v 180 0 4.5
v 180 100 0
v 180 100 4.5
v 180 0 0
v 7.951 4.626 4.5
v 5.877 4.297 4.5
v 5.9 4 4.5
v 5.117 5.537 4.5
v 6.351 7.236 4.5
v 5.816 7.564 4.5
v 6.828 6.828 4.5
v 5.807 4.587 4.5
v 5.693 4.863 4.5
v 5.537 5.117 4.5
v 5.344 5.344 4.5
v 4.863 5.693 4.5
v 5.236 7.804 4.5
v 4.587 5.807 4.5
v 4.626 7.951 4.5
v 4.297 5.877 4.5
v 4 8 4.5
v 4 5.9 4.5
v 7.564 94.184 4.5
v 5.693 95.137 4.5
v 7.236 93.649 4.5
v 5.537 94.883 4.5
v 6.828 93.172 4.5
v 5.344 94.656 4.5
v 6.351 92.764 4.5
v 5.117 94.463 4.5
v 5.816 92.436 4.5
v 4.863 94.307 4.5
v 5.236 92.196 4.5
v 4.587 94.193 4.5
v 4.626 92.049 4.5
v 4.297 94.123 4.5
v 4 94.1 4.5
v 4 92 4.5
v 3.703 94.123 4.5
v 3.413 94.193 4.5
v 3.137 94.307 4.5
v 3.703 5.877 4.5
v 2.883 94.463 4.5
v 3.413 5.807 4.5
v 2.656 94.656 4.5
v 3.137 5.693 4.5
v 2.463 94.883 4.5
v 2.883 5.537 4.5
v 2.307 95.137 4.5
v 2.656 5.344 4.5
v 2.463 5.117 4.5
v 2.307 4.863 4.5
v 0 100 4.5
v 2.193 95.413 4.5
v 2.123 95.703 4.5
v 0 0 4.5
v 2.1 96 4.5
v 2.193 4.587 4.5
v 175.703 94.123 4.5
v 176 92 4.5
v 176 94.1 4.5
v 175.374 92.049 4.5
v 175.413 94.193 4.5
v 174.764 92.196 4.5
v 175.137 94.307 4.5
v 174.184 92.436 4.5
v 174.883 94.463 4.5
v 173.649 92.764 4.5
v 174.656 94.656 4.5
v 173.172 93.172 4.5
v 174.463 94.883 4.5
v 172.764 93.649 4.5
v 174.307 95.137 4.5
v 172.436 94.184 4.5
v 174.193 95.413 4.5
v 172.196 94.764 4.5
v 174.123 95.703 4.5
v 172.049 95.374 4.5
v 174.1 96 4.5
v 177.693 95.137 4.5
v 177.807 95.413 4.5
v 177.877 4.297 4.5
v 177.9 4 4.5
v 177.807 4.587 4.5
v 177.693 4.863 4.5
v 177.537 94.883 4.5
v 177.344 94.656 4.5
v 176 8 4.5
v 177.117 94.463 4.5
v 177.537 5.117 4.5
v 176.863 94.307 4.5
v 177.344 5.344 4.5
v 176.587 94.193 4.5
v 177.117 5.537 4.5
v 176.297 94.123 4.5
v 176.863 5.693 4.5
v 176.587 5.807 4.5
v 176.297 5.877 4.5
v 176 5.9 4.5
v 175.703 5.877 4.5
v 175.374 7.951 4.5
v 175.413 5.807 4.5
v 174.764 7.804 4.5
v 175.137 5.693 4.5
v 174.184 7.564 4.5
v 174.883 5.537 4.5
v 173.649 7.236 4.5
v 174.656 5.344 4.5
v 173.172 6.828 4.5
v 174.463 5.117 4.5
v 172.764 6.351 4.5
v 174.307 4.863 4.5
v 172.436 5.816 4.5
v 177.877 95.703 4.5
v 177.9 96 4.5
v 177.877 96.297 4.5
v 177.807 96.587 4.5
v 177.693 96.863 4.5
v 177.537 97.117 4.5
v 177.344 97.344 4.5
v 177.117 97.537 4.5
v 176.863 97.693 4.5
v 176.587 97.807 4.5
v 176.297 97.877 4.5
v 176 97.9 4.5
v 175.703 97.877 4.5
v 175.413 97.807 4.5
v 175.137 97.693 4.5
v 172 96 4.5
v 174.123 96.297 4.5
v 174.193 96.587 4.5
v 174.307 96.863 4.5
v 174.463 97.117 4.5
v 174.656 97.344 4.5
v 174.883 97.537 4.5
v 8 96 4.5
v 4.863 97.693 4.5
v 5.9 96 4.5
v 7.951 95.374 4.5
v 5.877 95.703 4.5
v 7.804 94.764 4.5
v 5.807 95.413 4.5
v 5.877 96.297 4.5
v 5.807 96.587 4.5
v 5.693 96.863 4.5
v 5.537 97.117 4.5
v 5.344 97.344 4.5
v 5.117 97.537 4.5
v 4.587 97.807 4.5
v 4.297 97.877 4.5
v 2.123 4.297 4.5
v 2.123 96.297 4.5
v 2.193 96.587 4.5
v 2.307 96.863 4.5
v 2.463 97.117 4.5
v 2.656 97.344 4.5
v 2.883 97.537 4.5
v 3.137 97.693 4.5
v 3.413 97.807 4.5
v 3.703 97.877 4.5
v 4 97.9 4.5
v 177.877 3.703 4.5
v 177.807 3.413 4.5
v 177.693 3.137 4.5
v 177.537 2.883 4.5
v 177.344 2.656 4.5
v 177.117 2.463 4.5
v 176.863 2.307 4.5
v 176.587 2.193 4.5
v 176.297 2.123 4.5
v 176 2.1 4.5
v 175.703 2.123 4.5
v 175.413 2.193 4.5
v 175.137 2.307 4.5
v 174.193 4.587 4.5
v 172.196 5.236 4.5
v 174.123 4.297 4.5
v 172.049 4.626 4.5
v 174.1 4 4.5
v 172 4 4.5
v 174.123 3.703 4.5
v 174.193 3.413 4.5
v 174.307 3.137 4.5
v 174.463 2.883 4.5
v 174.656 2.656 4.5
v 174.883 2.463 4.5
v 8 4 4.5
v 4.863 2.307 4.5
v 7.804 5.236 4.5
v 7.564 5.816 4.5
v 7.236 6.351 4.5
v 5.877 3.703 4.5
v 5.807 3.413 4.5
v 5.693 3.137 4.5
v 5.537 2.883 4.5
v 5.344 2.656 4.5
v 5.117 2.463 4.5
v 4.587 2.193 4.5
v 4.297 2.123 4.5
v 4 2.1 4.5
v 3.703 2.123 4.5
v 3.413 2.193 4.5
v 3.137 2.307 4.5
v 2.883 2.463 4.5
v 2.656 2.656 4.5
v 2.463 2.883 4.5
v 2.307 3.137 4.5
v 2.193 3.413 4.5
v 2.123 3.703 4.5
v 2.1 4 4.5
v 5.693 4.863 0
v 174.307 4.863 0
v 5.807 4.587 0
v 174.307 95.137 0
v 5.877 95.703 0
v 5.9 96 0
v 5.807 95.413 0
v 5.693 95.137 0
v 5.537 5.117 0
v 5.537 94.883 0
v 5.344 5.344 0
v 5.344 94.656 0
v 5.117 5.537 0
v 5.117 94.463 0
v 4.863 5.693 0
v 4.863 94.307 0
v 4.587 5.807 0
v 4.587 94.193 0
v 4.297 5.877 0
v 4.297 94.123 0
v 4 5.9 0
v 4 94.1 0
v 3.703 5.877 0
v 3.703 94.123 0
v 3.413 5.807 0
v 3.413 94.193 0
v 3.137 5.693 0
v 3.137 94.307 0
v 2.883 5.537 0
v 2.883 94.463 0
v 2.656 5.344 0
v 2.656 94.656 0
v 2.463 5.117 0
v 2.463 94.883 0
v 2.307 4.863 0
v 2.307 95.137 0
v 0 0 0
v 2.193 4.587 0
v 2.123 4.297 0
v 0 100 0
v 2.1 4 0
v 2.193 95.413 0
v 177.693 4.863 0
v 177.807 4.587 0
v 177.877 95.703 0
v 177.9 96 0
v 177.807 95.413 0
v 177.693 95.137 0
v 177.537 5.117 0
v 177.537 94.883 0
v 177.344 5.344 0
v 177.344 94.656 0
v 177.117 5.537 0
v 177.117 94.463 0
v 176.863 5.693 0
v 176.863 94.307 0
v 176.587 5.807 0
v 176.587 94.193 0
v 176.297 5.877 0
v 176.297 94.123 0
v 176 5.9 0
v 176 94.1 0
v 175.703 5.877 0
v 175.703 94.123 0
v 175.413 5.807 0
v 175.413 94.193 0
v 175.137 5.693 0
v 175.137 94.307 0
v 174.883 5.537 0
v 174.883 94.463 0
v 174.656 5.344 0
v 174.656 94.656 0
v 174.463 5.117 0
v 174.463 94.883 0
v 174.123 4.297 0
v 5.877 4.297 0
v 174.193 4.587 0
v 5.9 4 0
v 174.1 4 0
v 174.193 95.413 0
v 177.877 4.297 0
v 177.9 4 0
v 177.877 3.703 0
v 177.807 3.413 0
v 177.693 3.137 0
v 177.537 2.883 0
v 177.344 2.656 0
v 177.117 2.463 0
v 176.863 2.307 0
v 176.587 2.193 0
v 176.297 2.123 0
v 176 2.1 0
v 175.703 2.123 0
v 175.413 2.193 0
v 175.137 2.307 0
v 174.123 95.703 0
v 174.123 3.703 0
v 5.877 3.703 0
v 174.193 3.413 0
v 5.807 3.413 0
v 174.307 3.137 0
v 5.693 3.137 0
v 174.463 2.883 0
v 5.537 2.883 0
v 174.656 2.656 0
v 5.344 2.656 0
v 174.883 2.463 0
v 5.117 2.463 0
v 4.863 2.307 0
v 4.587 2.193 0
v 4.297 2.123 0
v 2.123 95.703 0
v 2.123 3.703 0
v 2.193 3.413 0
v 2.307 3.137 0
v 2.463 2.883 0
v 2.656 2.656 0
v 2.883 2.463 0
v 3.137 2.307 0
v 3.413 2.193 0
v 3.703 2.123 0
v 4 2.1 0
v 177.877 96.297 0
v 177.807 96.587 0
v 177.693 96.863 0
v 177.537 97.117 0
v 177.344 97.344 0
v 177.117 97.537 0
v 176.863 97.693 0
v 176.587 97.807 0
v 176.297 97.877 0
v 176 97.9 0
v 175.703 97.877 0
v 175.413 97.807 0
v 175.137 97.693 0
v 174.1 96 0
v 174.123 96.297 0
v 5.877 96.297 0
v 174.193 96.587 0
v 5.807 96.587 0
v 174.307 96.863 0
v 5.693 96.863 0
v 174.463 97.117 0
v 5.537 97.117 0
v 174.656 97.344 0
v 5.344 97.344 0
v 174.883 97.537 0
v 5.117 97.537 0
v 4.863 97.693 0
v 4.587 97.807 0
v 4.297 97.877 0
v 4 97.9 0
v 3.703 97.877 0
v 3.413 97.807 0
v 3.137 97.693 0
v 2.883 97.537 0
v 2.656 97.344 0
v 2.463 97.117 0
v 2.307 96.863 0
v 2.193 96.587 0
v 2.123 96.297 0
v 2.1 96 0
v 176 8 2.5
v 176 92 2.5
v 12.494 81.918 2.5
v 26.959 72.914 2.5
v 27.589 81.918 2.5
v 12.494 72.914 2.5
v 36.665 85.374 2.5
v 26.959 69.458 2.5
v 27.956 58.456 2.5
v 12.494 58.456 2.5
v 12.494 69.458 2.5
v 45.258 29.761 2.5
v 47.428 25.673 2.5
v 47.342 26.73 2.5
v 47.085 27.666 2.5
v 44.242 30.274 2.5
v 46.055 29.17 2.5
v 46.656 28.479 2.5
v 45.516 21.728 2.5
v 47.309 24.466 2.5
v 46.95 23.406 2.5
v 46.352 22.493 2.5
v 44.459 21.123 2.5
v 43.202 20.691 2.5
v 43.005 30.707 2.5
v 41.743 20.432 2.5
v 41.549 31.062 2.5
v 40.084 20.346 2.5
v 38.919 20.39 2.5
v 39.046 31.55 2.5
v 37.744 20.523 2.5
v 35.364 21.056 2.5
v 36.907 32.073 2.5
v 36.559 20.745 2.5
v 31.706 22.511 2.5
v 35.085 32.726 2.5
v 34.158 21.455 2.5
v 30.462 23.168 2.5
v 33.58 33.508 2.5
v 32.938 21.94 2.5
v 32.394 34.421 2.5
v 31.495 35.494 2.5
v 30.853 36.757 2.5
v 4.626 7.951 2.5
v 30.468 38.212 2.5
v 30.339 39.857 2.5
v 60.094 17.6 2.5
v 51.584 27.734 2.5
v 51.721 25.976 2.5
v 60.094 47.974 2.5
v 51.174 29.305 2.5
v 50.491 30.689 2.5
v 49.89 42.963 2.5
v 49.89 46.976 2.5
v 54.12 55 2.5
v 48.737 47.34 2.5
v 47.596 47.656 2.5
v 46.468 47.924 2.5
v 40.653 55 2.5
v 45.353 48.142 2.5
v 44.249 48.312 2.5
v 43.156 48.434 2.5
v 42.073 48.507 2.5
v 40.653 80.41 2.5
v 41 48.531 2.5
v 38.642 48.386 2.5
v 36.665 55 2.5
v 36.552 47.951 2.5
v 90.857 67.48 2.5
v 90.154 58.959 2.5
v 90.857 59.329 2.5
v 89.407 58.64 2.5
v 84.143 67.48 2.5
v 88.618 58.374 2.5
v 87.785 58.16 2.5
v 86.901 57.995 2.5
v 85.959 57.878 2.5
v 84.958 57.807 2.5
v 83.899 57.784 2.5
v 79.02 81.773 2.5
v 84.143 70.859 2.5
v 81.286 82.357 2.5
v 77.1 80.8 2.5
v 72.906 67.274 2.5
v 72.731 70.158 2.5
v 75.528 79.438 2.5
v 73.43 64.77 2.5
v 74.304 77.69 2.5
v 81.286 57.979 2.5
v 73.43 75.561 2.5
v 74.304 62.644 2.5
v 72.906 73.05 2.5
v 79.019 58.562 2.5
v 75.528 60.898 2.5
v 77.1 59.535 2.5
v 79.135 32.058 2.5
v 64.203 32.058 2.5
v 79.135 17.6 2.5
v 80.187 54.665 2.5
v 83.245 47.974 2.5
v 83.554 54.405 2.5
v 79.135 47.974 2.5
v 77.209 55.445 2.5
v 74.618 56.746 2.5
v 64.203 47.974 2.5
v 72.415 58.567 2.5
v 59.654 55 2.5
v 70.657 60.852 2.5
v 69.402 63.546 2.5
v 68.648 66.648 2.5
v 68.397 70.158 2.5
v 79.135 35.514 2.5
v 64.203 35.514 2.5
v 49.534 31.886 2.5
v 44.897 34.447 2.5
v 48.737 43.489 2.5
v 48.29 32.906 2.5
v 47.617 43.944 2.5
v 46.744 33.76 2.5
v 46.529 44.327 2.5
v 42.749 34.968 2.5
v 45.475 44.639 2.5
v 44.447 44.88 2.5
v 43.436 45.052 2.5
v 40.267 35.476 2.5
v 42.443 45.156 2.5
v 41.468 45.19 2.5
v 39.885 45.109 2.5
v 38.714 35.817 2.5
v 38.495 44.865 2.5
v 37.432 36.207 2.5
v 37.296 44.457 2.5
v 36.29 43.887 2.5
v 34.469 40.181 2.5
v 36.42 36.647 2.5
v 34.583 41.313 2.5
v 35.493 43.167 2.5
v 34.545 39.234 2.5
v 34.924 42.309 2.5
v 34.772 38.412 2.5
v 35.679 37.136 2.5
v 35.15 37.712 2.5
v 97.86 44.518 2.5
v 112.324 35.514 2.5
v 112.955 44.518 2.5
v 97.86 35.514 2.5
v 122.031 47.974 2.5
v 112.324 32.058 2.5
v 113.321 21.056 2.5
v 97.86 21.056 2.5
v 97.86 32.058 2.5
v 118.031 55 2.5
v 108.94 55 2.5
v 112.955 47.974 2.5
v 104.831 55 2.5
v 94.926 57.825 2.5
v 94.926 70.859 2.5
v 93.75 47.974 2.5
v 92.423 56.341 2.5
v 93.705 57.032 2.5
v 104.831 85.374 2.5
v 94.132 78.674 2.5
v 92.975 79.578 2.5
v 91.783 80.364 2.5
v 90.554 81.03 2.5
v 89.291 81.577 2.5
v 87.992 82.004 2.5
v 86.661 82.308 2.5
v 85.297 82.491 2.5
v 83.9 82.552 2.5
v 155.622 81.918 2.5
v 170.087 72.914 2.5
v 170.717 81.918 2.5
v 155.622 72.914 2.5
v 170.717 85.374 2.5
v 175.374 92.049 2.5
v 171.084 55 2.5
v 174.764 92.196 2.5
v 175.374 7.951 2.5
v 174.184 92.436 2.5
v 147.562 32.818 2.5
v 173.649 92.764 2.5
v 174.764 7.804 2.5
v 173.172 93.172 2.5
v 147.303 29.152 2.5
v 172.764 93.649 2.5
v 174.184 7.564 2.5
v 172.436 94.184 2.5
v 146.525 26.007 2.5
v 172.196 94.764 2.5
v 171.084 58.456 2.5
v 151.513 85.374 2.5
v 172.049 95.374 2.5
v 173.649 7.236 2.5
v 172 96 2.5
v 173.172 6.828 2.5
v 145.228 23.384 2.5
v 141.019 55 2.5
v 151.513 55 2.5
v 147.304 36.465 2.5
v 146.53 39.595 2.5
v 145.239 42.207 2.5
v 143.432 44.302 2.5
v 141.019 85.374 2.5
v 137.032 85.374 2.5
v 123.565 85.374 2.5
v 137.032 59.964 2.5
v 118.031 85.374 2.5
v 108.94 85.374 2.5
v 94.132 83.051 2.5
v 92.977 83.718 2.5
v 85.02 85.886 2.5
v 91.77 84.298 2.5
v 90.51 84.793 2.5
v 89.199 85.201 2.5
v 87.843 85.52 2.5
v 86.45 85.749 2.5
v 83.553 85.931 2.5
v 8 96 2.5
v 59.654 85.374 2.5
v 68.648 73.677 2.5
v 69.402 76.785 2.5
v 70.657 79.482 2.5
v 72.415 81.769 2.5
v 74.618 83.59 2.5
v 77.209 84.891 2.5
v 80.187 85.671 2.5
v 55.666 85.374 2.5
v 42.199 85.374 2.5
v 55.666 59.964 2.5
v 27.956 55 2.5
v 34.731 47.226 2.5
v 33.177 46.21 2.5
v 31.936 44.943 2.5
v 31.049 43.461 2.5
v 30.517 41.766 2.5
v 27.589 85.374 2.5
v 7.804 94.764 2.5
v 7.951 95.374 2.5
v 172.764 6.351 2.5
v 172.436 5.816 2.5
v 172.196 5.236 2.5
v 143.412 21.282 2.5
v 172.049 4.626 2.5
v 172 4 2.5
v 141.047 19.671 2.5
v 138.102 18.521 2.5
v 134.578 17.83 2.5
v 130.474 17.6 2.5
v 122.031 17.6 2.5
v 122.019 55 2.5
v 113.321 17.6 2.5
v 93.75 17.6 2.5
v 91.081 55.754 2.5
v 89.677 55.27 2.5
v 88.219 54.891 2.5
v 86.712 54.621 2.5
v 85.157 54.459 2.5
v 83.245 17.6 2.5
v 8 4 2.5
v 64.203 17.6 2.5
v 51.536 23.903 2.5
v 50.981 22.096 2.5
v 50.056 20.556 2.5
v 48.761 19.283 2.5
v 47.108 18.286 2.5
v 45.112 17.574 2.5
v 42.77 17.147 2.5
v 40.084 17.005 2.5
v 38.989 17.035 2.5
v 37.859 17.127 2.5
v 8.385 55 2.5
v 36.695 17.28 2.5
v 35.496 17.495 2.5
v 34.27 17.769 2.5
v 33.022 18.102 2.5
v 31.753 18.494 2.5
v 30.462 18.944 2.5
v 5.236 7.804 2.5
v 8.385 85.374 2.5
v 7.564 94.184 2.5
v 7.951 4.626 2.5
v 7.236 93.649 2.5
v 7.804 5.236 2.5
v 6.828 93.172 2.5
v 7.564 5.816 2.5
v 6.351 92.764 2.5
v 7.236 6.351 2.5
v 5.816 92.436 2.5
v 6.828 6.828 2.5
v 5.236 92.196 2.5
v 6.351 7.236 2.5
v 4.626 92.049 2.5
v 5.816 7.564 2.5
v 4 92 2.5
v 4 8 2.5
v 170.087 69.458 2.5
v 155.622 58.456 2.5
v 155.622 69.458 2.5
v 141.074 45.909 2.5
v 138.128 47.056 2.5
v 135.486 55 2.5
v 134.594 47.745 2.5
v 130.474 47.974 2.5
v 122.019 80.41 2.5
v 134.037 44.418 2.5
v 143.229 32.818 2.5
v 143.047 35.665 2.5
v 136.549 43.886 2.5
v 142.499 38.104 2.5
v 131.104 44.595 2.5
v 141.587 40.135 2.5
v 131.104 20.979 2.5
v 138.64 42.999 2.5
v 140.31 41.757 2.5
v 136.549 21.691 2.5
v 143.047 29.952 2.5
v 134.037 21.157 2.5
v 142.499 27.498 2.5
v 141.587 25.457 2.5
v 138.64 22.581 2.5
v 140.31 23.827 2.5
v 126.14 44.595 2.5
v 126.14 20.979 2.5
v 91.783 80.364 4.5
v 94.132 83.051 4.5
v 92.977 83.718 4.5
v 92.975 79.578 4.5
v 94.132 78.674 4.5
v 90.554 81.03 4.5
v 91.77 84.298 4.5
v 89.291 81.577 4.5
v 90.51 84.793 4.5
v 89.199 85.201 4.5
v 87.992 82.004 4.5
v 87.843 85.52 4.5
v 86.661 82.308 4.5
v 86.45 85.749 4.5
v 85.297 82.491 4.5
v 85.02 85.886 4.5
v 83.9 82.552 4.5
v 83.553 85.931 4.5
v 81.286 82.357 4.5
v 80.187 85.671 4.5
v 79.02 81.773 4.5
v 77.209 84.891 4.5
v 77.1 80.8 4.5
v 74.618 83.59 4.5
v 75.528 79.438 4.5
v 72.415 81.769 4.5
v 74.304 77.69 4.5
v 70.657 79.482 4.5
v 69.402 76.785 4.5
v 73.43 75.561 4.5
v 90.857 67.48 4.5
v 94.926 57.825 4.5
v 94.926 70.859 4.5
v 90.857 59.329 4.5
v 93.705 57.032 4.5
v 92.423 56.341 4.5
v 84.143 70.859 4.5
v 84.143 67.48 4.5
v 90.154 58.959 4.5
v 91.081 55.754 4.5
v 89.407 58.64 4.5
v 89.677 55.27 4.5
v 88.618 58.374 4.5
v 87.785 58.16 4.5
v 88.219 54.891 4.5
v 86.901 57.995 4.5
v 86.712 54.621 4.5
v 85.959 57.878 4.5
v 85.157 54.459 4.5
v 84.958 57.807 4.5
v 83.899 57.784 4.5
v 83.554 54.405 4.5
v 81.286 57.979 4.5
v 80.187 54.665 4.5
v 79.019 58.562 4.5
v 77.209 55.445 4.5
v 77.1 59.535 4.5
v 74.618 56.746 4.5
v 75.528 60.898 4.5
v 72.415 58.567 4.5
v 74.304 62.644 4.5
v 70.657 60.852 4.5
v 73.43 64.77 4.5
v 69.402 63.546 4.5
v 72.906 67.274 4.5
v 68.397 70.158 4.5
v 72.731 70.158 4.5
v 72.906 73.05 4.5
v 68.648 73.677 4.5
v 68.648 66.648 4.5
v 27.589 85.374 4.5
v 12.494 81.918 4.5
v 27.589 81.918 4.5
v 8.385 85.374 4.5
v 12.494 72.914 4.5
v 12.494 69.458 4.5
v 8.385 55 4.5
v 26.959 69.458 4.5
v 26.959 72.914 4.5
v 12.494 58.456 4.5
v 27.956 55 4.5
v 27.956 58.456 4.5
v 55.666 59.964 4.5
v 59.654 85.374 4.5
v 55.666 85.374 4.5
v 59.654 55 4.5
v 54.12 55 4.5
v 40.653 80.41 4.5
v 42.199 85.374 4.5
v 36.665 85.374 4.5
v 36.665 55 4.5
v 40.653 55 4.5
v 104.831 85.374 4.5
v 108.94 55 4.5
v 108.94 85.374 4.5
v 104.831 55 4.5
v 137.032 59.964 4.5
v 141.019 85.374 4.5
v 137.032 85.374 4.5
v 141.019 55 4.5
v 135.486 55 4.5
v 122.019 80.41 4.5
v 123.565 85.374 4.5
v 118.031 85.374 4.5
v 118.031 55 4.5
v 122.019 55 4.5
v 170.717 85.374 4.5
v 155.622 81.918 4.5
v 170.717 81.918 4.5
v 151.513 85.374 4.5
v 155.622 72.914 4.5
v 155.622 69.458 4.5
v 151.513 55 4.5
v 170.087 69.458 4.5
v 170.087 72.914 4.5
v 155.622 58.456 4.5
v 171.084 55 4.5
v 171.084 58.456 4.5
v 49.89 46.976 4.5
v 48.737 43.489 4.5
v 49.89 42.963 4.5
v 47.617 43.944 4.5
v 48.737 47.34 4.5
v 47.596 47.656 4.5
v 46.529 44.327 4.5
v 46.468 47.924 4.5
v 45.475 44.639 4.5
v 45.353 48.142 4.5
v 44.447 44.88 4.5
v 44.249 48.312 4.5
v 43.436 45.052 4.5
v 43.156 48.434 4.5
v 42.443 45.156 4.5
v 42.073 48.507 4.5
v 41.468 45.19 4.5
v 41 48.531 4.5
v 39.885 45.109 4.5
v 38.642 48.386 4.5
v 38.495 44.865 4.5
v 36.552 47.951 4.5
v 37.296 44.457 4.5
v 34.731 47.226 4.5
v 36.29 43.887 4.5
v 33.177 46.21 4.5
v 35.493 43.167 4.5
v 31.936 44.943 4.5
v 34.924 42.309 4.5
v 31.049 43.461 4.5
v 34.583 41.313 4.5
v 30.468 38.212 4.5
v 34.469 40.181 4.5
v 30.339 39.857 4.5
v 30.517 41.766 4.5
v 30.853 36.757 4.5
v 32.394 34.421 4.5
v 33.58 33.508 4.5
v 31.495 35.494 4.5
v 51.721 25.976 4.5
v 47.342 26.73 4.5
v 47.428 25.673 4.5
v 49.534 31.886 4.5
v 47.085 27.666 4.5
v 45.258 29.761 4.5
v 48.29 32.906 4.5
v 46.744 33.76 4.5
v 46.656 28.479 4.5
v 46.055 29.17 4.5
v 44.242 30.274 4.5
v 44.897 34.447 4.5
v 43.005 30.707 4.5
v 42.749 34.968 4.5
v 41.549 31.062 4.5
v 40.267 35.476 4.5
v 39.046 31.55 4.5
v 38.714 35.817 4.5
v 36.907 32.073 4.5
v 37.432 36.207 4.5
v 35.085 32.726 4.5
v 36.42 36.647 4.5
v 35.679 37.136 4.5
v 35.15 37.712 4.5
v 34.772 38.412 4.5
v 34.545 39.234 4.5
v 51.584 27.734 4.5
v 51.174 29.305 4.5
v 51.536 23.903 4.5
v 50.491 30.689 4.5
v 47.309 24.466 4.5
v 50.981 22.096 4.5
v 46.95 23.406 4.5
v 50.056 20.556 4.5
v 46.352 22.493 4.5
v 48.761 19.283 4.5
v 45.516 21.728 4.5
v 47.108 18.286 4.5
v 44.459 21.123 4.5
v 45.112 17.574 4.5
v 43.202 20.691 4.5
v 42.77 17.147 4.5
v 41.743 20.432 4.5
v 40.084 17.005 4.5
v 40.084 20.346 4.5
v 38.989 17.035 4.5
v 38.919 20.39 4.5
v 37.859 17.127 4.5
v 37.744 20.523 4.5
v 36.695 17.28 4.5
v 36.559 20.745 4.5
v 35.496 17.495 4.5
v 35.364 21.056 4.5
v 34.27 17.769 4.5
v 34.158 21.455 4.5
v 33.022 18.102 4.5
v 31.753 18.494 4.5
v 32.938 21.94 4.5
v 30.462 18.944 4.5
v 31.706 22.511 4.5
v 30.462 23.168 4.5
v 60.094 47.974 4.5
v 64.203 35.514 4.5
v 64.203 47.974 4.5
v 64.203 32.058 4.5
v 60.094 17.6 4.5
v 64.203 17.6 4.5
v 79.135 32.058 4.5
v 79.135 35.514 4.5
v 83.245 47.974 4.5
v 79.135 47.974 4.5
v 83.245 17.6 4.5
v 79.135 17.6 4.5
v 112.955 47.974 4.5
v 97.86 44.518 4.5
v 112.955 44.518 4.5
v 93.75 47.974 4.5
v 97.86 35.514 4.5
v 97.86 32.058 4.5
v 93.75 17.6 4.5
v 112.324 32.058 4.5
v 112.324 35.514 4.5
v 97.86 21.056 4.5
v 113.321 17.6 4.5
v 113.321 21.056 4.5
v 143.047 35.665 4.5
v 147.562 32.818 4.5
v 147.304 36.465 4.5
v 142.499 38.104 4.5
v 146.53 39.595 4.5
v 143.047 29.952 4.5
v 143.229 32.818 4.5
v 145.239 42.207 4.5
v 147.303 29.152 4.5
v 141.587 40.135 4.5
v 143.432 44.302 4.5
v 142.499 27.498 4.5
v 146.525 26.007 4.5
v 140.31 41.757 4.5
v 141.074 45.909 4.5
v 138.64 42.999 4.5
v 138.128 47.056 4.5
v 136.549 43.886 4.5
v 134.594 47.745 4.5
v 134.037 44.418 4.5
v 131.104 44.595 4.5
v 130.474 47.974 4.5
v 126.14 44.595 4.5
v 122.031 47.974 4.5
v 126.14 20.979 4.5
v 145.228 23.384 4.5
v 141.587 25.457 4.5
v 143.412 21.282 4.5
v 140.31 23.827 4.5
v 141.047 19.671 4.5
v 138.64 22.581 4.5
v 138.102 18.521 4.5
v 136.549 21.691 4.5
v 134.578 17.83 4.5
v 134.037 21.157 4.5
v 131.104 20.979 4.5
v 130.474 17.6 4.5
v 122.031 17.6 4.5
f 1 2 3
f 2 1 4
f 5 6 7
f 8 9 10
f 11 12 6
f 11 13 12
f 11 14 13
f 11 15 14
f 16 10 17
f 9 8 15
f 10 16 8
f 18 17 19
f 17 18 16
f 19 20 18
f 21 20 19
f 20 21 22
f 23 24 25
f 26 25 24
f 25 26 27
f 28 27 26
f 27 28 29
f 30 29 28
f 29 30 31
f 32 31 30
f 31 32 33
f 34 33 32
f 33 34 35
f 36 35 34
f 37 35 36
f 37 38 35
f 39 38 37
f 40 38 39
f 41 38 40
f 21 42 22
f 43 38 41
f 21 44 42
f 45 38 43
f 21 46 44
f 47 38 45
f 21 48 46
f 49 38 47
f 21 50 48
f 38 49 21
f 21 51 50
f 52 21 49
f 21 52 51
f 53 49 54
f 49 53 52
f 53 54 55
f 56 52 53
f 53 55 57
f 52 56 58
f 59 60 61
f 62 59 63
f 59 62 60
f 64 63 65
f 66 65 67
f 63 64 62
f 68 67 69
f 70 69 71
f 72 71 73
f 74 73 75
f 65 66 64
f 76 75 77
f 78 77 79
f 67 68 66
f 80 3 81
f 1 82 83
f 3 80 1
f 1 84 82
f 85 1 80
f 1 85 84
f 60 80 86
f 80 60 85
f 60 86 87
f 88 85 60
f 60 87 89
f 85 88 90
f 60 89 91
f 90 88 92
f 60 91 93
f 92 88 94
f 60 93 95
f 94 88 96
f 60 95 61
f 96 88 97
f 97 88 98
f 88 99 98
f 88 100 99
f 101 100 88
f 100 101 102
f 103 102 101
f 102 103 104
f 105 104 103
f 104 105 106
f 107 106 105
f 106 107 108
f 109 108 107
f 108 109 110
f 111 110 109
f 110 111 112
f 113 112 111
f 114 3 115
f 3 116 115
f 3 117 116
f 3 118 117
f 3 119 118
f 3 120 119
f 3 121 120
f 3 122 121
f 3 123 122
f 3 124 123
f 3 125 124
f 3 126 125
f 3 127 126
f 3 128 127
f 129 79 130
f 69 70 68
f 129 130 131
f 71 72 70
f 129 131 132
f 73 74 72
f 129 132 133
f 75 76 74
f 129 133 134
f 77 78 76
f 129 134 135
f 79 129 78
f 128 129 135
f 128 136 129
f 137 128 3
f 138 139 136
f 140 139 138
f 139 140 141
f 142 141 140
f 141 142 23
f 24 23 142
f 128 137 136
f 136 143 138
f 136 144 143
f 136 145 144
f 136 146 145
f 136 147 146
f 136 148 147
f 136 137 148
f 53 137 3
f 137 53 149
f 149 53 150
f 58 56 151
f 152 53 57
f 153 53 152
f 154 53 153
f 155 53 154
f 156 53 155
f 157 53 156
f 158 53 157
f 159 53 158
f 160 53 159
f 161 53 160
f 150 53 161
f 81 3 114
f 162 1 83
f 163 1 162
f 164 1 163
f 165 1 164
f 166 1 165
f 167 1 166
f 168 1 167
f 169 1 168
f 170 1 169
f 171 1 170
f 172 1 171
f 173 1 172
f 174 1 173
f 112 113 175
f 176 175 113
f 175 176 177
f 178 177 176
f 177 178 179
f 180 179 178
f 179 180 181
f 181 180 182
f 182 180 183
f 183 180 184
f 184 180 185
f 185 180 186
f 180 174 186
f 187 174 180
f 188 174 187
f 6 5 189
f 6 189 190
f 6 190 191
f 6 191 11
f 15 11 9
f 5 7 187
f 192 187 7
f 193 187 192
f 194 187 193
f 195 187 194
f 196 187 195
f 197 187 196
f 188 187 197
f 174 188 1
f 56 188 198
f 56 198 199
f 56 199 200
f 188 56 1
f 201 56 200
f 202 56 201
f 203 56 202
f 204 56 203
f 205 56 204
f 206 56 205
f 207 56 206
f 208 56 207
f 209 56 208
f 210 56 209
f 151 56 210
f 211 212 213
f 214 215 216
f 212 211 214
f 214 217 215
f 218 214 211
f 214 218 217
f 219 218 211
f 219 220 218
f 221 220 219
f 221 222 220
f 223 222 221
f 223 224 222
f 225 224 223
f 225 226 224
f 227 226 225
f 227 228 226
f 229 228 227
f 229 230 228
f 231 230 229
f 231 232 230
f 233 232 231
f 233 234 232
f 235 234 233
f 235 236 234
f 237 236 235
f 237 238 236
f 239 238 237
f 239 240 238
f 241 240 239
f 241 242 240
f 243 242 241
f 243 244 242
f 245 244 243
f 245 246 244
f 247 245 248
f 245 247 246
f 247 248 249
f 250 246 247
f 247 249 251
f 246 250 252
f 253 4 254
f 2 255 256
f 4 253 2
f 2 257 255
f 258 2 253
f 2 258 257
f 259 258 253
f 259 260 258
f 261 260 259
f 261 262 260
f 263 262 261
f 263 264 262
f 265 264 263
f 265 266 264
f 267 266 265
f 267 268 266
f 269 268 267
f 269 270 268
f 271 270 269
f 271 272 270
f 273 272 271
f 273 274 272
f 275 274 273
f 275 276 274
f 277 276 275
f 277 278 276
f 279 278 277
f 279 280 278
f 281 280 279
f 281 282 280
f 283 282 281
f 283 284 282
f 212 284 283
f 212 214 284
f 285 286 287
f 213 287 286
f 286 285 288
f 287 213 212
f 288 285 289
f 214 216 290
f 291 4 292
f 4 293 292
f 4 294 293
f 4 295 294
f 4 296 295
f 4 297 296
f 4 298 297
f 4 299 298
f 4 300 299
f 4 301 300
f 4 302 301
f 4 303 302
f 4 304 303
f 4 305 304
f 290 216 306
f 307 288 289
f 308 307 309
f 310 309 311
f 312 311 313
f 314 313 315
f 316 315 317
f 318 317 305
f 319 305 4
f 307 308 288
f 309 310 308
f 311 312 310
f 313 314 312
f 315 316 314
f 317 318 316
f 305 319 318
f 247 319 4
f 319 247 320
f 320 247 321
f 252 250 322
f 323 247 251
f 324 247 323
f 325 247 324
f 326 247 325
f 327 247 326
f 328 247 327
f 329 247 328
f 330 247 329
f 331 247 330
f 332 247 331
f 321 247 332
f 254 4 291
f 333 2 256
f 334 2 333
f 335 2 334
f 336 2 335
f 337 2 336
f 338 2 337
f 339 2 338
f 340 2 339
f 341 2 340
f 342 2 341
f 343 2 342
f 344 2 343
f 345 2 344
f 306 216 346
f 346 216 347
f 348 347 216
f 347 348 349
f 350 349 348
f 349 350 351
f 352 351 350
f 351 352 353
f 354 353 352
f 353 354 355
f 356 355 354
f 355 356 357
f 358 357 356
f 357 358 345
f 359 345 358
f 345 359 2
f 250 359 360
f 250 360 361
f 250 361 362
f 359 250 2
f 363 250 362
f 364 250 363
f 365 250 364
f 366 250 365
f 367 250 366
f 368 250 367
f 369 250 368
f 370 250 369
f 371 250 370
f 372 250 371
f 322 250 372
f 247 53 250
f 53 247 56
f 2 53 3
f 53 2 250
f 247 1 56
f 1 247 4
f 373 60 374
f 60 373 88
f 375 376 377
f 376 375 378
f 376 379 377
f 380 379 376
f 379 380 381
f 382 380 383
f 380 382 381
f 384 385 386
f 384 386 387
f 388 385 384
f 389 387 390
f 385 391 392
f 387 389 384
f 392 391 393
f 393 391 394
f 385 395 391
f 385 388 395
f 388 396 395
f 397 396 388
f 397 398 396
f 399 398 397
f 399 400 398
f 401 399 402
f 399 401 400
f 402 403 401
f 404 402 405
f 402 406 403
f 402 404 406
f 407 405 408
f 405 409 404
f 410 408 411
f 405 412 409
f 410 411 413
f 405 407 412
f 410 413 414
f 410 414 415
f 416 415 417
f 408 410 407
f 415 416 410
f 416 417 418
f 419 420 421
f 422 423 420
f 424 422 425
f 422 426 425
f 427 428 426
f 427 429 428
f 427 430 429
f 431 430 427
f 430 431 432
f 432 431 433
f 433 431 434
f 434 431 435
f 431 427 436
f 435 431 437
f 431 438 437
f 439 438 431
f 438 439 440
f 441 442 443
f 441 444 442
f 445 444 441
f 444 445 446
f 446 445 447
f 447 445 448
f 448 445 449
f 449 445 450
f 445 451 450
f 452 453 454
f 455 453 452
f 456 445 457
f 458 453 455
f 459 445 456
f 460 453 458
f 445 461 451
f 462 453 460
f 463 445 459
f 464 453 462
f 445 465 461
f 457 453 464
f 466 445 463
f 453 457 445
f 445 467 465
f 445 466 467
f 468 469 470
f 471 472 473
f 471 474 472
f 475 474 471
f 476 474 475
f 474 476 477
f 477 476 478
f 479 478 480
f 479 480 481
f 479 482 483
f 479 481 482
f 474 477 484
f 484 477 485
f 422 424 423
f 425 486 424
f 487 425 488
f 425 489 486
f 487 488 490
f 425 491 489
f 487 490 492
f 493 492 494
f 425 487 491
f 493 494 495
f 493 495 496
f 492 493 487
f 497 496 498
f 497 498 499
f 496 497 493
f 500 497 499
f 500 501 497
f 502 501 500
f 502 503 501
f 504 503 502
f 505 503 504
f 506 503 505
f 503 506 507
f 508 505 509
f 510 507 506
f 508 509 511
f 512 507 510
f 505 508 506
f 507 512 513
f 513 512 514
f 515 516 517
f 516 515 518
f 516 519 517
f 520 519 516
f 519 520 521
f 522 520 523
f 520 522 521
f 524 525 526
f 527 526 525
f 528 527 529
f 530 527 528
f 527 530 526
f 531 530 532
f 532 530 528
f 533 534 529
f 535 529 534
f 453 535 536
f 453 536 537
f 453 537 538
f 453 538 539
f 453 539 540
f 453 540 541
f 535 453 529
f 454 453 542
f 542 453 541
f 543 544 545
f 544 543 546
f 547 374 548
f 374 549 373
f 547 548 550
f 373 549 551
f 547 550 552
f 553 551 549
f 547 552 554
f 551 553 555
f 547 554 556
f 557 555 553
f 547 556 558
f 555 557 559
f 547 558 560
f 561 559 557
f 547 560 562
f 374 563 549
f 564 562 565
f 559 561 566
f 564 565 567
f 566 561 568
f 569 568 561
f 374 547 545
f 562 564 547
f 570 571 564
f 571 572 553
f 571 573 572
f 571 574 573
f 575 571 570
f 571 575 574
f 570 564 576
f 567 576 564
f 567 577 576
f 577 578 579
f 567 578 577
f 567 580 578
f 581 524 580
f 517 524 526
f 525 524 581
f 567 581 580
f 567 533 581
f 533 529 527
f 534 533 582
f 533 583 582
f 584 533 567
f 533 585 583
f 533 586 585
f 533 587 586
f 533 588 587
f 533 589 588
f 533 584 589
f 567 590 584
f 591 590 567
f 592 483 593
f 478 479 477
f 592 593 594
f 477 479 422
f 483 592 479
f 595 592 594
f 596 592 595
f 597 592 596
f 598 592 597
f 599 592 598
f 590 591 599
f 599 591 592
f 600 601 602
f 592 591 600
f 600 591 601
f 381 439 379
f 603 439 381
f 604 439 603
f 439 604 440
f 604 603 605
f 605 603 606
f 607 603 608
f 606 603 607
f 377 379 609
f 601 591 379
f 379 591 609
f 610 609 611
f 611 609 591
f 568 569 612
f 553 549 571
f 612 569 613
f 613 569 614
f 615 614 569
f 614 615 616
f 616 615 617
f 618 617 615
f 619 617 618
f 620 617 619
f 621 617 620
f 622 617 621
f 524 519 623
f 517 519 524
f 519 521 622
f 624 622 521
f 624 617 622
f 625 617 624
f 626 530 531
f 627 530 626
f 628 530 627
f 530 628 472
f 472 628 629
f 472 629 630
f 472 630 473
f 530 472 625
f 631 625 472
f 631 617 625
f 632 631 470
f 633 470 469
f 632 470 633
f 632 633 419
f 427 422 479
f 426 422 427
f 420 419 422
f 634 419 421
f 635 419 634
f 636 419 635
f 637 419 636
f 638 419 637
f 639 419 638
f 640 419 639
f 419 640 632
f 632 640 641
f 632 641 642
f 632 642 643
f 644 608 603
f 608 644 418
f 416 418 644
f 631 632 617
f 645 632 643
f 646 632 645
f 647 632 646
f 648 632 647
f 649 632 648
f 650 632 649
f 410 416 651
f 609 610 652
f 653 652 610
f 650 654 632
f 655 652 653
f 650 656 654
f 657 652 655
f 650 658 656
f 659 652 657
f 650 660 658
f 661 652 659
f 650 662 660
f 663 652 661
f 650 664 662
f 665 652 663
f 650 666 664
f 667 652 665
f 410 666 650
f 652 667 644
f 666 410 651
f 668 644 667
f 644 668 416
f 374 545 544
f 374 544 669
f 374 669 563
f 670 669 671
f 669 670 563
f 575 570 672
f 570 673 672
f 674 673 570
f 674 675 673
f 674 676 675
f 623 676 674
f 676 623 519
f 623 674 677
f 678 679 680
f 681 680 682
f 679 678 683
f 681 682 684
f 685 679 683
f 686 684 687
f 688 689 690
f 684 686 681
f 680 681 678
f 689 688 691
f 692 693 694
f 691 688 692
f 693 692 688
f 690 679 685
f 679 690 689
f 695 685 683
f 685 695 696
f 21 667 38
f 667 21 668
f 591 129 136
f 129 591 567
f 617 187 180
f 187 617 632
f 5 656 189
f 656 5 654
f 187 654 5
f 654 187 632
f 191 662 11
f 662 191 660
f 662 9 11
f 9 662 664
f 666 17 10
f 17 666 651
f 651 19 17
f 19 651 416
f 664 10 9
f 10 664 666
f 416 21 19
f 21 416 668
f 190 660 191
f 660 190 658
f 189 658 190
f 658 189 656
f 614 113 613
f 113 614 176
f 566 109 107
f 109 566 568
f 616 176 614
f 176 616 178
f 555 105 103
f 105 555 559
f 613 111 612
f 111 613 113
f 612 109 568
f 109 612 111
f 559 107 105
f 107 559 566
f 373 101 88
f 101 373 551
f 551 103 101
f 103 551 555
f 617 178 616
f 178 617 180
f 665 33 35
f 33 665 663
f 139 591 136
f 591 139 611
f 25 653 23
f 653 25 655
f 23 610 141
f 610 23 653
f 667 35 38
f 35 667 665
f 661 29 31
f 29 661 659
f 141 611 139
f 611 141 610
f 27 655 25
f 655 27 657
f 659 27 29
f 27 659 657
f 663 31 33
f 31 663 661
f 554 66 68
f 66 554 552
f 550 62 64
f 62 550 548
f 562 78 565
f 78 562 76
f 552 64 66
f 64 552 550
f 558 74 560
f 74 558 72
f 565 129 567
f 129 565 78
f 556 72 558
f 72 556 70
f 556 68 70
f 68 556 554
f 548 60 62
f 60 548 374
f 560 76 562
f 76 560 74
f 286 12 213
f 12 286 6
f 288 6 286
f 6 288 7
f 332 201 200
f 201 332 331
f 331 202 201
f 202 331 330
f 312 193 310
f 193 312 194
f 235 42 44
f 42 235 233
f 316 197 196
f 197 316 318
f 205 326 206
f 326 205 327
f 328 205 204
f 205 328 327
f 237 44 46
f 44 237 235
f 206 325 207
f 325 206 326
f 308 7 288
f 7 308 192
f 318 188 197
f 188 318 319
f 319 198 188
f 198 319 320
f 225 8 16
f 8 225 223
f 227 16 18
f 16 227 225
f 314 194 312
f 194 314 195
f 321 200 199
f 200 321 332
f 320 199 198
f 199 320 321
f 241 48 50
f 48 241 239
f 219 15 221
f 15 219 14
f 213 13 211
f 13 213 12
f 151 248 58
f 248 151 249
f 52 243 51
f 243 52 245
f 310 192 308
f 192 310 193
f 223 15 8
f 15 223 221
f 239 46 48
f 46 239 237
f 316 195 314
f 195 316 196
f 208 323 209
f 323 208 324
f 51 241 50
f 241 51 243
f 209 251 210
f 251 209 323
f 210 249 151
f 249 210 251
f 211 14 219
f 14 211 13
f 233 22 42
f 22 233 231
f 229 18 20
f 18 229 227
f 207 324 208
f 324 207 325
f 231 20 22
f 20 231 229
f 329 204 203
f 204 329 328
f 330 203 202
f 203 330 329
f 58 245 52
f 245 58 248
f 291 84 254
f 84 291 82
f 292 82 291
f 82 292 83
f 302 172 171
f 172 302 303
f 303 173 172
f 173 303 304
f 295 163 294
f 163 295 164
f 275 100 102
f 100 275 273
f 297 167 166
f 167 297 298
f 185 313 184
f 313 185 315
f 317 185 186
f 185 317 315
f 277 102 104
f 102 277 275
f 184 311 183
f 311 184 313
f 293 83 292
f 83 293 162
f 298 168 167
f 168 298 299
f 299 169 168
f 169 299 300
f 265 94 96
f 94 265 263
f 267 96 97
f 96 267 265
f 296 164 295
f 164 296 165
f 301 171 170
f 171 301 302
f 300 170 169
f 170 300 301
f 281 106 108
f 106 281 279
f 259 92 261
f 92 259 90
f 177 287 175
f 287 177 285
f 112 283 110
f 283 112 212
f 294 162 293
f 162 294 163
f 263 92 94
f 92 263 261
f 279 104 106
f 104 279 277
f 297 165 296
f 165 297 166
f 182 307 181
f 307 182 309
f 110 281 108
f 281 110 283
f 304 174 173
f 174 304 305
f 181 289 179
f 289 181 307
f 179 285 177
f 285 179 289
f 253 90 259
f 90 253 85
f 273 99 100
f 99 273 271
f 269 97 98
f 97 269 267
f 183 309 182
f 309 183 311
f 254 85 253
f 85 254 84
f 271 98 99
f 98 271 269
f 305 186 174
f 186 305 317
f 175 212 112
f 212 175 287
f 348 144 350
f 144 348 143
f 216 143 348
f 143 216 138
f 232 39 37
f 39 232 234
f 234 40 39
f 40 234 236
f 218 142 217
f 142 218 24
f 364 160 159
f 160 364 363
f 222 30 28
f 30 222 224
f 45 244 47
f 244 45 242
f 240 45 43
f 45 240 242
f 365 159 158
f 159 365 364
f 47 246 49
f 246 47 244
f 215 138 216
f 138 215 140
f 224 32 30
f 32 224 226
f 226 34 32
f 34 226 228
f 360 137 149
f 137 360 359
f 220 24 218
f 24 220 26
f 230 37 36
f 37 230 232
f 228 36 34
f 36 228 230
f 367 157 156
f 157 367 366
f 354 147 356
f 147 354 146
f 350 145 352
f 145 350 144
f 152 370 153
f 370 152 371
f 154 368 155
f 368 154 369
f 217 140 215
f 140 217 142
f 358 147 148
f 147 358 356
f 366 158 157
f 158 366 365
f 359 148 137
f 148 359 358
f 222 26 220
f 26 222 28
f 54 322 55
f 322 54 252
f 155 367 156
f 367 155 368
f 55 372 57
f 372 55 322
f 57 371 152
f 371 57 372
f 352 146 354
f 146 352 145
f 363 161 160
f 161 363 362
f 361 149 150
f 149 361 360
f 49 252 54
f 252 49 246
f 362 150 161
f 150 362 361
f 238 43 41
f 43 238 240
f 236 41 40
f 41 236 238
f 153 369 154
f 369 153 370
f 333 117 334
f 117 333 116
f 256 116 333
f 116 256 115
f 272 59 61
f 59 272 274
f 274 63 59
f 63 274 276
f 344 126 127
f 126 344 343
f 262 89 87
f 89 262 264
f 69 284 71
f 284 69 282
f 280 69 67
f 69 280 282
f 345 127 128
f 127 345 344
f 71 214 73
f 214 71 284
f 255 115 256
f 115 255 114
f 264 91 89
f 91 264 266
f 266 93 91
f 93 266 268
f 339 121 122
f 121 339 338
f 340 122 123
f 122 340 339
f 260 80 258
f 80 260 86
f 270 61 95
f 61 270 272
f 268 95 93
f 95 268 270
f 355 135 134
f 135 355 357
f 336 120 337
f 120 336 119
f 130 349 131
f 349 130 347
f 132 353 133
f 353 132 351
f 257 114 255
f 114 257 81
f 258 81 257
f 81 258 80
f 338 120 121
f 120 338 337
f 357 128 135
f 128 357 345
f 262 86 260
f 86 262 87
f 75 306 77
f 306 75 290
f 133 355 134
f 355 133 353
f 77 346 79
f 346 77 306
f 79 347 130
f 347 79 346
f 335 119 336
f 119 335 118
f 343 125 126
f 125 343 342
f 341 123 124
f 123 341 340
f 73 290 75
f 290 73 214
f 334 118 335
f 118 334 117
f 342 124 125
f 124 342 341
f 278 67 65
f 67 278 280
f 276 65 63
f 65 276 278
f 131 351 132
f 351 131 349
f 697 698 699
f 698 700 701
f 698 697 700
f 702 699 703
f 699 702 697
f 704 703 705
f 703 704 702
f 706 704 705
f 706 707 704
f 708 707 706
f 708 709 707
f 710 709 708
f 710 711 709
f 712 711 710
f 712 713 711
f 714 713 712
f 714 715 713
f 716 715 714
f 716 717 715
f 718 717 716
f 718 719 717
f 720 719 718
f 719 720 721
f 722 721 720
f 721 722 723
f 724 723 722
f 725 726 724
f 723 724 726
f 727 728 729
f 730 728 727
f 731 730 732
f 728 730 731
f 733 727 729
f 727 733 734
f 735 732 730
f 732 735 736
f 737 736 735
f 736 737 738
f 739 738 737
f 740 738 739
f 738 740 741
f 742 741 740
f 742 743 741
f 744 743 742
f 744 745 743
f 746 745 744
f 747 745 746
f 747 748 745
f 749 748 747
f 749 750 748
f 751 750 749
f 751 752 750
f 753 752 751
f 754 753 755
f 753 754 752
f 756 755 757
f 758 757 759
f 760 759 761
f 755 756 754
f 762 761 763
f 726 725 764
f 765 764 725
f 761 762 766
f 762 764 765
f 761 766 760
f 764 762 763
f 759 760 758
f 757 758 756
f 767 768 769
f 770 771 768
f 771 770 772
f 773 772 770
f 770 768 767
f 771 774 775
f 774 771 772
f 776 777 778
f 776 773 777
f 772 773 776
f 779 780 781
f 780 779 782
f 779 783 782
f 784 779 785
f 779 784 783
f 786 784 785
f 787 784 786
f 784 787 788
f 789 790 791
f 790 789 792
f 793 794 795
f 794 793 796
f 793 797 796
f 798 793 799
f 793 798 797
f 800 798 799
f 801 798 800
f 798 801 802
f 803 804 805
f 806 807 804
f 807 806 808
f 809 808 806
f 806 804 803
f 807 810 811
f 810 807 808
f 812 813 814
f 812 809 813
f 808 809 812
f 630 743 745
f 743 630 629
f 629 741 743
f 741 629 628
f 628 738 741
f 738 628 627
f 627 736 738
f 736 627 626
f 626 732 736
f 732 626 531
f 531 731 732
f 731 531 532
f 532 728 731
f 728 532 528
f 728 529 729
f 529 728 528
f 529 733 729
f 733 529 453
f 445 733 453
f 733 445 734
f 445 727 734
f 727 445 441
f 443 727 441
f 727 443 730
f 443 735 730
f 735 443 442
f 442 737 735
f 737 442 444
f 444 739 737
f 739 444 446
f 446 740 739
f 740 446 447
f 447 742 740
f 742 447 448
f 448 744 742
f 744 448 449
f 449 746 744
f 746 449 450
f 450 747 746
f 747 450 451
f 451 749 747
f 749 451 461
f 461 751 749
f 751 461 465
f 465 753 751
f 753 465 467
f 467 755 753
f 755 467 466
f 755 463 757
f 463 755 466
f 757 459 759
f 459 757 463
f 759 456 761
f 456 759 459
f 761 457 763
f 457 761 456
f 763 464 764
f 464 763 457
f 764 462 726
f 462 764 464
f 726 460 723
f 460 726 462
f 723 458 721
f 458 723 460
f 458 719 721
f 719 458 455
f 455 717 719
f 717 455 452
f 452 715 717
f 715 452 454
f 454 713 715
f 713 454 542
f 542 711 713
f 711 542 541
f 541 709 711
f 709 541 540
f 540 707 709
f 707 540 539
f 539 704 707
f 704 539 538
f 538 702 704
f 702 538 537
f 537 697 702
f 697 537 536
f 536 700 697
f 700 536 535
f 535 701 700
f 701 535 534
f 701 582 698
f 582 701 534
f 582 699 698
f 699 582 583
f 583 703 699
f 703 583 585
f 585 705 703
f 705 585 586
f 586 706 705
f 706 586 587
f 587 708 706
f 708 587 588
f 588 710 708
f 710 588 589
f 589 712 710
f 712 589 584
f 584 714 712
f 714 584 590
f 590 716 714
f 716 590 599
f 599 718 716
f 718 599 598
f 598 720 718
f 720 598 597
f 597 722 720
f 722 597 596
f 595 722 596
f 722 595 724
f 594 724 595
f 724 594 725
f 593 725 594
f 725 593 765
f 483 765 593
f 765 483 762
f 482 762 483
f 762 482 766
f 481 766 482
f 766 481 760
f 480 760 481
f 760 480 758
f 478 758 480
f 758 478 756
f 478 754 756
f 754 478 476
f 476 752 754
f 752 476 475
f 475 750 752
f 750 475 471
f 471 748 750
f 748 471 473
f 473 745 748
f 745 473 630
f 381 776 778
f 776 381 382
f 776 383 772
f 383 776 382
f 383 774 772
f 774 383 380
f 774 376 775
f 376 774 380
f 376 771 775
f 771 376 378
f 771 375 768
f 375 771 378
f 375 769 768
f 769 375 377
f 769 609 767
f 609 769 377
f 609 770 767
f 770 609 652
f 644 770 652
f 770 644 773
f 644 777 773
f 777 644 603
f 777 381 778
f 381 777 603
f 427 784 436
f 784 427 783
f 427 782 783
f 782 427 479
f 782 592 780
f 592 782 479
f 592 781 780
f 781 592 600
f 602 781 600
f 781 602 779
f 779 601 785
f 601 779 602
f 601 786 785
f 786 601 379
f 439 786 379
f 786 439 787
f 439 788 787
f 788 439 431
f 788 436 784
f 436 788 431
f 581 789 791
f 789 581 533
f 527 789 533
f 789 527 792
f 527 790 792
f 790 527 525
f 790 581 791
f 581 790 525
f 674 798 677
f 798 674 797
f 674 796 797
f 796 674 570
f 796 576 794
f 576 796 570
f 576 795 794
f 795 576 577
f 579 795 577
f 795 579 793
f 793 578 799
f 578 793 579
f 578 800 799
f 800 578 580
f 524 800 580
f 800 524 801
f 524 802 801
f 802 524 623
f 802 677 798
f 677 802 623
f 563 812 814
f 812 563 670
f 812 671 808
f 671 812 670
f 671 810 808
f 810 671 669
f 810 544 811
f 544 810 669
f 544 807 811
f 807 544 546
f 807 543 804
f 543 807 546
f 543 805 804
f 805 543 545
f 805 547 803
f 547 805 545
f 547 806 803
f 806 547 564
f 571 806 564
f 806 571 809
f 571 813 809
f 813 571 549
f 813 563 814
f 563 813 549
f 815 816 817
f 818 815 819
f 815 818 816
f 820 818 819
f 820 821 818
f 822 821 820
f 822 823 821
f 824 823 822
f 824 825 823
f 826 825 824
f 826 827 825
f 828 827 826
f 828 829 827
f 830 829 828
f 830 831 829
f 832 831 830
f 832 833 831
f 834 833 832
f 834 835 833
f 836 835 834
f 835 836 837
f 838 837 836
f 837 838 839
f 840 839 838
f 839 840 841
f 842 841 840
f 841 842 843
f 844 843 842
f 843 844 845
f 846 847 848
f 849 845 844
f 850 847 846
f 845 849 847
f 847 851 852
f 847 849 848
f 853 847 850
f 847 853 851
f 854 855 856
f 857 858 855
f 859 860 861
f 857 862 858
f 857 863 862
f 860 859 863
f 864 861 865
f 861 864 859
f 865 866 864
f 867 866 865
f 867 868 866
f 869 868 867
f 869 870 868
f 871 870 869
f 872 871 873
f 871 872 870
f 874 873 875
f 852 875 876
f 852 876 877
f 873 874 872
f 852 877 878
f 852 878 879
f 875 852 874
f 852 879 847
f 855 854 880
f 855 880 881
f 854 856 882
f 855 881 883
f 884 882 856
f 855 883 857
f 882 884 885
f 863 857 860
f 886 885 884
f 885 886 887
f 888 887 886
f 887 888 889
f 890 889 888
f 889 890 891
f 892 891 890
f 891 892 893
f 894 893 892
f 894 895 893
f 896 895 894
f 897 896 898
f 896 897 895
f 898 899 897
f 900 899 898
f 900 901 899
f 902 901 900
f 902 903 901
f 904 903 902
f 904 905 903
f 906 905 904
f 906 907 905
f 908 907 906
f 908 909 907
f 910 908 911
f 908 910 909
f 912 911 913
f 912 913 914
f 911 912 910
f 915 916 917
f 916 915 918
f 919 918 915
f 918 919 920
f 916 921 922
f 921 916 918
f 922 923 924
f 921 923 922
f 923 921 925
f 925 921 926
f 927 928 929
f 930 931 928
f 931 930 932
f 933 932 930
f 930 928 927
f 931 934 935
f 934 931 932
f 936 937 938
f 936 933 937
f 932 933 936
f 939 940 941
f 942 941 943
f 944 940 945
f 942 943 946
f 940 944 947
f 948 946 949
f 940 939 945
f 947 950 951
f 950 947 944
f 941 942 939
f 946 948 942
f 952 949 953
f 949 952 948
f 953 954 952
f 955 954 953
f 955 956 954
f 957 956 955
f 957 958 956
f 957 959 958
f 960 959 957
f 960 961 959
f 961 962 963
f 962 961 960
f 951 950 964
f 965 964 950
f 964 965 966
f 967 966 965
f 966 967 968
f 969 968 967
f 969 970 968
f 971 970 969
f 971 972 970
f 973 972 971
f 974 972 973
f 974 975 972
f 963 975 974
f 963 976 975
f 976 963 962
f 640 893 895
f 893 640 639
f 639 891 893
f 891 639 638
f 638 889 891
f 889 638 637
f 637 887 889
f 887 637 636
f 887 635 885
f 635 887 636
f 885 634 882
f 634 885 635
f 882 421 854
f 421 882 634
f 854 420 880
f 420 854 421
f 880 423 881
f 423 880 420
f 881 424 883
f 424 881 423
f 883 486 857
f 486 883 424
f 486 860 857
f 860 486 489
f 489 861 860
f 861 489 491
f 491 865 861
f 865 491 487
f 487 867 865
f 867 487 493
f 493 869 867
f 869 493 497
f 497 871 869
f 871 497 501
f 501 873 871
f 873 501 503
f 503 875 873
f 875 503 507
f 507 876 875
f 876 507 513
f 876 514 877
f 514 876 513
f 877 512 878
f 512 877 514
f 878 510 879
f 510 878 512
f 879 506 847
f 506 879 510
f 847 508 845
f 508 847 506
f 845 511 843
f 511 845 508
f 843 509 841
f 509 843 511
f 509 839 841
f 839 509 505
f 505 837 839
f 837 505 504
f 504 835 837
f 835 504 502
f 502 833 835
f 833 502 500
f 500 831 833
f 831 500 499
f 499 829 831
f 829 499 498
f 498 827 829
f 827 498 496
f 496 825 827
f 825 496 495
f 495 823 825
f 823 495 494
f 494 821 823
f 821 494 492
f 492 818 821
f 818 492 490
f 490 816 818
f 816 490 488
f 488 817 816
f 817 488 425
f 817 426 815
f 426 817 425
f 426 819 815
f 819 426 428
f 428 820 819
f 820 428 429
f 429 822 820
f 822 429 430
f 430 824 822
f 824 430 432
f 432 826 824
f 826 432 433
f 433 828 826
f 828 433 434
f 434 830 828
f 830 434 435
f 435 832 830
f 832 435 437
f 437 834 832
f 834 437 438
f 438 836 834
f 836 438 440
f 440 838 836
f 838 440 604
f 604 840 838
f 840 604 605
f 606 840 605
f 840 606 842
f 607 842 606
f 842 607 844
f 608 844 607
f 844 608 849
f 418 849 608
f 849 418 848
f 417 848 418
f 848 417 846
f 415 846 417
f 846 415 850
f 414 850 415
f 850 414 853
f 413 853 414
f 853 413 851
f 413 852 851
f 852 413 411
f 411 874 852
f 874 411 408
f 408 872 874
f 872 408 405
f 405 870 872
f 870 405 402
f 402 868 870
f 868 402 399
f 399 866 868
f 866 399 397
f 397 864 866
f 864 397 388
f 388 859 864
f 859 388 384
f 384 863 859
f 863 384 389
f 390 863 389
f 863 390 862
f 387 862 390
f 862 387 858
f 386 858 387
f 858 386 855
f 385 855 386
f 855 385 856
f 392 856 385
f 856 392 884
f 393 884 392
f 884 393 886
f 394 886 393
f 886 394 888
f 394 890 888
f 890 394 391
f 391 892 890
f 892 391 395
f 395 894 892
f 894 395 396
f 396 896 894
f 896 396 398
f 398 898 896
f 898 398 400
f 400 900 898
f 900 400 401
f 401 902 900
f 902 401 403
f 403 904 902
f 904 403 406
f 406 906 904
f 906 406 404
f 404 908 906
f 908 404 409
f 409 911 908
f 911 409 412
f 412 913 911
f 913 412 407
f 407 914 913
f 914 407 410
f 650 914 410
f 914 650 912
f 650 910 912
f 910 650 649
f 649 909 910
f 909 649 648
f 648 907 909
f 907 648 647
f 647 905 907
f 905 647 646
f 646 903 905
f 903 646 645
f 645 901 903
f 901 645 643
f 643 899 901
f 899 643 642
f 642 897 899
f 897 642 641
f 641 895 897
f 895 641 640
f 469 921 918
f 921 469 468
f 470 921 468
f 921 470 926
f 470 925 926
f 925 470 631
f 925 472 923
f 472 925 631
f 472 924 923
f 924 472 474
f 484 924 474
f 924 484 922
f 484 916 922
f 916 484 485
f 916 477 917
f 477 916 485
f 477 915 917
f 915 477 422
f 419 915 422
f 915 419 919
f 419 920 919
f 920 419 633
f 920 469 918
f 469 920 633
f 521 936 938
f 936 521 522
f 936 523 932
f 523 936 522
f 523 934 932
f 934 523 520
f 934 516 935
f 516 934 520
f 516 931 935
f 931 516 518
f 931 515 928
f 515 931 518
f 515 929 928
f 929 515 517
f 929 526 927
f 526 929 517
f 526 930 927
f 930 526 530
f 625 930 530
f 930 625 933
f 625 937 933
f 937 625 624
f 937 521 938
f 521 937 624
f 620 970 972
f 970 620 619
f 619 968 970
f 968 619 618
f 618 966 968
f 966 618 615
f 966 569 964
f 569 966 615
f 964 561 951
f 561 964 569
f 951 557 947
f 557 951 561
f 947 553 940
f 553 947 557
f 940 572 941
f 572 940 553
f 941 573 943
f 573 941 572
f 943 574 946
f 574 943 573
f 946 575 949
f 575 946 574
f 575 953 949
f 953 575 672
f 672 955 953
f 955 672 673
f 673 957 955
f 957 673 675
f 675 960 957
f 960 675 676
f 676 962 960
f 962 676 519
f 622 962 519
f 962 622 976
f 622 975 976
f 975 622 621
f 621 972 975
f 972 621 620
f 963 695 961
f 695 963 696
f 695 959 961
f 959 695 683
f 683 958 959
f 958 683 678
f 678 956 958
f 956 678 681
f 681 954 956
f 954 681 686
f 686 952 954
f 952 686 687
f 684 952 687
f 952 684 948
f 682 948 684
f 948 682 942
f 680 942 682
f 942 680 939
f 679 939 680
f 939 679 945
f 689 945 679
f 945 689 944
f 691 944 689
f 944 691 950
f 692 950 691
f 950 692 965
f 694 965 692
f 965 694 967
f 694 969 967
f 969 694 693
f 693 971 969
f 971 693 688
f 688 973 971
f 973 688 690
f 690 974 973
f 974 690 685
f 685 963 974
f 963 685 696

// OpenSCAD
//  Oblong Nameplate
//  Peter Griffiths

plate_length = 180;
plate_width = 100;
plate_thickness = 4.5;
letter_depth = 2;
surround_width = 4; // Border Thickness
hole_diameter = 3.8; // zero removes holes
counter_sink = 0; // zero removes countersink
f_ont = "roboto";
f_size = 30; // Letter Size
f_space = 1.1; // Letter spacing
text1 = "ENGINE";
text2 = "SHED";

module plate()
    difference(){
        cube([plate_length,plate_width,plate_thickness]);
        translate([surround_width,surround_width,plate_thickness - letter_depth])
            cube([plate_length - surround_width*2, plate_width - surround_width*2,letter_depth+1]);
    }

module plate_main(){
 plate();
 translate([surround_width,surround_width,0])
        cylinder(r=surround_width,h=plate_thickness);
 translate([plate_length - surround_width,surround_width,0])
        cylinder(r=surround_width,h=plate_thickness);
 translate([surround_width,plate_width - surround_width,0])
        cylinder(r=surround_width,h=plate_thickness);
 translate([plate_length - surround_width,plate_width - surround_width,0])
        cylinder(r=surround_width,h=plate_thickness);
}        
 if (hole_diameter >0){
     difference(){
         plate_main();
         $fn=40;
         translate([surround_width,surround_width,-0.5])
            cylinder(d=hole_diameter , h= plate_thickness+1);
         translate([plate_length - surround_width,surround_width,-0.5])
            cylinder(d=hole_diameter, h=plate_thickness+1);
         translate([surround_width,plate_width - surround_width,-0.5])
            cylinder(d=hole_diameter, h=plate_thickness+1);
         translate([plate_length - surround_width,plate_width - surround_width,-0.5])
            cylinder(d=hole_diameter, h=plate_thickness+1);
         
         if (counter_sink >0){
             translate([surround_width,surround_width, plate_thickness- counter_sink])
             cylinder(h=counter_sink, d1=hole_diameter, d2=hole_diameter + counter_sink*2);
             translate([plate_length - surround_width,surround_width,plate_thickness-counter_sink])
             cylinder(h=counter_sink, d1=hole_diameter,   d2=hole_diameter + counter_sink*2);
             translate([surround_width,plate_width -surround_width, plate_thickness- counter_sink])
             cylinder(h=counter_sink, d1=hole_diameter, d2=hole_diameter + counter_sink*2);
             translate([plate_length - surround_width,plate_width - surround_width, plate_thickness- counter_sink])
             cylinder(h=counter_sink, d1=hole_diameter, d2=hole_diameter + counter_sink*2);
         }
     }   
 }
// Text line 1
 translate([plate_length/2,plate_width/2+f_size/6, plate_thickness - letter_depth]) {
     linear_extrude(height = letter_depth){
        text(text1, font = f_ont, size = f_size, halign = "center", spacing= f_space);
     }
 }
 // Text line 2
  translate([ plate_length/2,plate_width/2-f_size*1.08, plate_thickness - letter_depth]) {
     linear_extrude(height = letter_depth){
        text(text2, font = f_ont, size = f_size, halign = "center",spacing= f_space);
     }
 }
